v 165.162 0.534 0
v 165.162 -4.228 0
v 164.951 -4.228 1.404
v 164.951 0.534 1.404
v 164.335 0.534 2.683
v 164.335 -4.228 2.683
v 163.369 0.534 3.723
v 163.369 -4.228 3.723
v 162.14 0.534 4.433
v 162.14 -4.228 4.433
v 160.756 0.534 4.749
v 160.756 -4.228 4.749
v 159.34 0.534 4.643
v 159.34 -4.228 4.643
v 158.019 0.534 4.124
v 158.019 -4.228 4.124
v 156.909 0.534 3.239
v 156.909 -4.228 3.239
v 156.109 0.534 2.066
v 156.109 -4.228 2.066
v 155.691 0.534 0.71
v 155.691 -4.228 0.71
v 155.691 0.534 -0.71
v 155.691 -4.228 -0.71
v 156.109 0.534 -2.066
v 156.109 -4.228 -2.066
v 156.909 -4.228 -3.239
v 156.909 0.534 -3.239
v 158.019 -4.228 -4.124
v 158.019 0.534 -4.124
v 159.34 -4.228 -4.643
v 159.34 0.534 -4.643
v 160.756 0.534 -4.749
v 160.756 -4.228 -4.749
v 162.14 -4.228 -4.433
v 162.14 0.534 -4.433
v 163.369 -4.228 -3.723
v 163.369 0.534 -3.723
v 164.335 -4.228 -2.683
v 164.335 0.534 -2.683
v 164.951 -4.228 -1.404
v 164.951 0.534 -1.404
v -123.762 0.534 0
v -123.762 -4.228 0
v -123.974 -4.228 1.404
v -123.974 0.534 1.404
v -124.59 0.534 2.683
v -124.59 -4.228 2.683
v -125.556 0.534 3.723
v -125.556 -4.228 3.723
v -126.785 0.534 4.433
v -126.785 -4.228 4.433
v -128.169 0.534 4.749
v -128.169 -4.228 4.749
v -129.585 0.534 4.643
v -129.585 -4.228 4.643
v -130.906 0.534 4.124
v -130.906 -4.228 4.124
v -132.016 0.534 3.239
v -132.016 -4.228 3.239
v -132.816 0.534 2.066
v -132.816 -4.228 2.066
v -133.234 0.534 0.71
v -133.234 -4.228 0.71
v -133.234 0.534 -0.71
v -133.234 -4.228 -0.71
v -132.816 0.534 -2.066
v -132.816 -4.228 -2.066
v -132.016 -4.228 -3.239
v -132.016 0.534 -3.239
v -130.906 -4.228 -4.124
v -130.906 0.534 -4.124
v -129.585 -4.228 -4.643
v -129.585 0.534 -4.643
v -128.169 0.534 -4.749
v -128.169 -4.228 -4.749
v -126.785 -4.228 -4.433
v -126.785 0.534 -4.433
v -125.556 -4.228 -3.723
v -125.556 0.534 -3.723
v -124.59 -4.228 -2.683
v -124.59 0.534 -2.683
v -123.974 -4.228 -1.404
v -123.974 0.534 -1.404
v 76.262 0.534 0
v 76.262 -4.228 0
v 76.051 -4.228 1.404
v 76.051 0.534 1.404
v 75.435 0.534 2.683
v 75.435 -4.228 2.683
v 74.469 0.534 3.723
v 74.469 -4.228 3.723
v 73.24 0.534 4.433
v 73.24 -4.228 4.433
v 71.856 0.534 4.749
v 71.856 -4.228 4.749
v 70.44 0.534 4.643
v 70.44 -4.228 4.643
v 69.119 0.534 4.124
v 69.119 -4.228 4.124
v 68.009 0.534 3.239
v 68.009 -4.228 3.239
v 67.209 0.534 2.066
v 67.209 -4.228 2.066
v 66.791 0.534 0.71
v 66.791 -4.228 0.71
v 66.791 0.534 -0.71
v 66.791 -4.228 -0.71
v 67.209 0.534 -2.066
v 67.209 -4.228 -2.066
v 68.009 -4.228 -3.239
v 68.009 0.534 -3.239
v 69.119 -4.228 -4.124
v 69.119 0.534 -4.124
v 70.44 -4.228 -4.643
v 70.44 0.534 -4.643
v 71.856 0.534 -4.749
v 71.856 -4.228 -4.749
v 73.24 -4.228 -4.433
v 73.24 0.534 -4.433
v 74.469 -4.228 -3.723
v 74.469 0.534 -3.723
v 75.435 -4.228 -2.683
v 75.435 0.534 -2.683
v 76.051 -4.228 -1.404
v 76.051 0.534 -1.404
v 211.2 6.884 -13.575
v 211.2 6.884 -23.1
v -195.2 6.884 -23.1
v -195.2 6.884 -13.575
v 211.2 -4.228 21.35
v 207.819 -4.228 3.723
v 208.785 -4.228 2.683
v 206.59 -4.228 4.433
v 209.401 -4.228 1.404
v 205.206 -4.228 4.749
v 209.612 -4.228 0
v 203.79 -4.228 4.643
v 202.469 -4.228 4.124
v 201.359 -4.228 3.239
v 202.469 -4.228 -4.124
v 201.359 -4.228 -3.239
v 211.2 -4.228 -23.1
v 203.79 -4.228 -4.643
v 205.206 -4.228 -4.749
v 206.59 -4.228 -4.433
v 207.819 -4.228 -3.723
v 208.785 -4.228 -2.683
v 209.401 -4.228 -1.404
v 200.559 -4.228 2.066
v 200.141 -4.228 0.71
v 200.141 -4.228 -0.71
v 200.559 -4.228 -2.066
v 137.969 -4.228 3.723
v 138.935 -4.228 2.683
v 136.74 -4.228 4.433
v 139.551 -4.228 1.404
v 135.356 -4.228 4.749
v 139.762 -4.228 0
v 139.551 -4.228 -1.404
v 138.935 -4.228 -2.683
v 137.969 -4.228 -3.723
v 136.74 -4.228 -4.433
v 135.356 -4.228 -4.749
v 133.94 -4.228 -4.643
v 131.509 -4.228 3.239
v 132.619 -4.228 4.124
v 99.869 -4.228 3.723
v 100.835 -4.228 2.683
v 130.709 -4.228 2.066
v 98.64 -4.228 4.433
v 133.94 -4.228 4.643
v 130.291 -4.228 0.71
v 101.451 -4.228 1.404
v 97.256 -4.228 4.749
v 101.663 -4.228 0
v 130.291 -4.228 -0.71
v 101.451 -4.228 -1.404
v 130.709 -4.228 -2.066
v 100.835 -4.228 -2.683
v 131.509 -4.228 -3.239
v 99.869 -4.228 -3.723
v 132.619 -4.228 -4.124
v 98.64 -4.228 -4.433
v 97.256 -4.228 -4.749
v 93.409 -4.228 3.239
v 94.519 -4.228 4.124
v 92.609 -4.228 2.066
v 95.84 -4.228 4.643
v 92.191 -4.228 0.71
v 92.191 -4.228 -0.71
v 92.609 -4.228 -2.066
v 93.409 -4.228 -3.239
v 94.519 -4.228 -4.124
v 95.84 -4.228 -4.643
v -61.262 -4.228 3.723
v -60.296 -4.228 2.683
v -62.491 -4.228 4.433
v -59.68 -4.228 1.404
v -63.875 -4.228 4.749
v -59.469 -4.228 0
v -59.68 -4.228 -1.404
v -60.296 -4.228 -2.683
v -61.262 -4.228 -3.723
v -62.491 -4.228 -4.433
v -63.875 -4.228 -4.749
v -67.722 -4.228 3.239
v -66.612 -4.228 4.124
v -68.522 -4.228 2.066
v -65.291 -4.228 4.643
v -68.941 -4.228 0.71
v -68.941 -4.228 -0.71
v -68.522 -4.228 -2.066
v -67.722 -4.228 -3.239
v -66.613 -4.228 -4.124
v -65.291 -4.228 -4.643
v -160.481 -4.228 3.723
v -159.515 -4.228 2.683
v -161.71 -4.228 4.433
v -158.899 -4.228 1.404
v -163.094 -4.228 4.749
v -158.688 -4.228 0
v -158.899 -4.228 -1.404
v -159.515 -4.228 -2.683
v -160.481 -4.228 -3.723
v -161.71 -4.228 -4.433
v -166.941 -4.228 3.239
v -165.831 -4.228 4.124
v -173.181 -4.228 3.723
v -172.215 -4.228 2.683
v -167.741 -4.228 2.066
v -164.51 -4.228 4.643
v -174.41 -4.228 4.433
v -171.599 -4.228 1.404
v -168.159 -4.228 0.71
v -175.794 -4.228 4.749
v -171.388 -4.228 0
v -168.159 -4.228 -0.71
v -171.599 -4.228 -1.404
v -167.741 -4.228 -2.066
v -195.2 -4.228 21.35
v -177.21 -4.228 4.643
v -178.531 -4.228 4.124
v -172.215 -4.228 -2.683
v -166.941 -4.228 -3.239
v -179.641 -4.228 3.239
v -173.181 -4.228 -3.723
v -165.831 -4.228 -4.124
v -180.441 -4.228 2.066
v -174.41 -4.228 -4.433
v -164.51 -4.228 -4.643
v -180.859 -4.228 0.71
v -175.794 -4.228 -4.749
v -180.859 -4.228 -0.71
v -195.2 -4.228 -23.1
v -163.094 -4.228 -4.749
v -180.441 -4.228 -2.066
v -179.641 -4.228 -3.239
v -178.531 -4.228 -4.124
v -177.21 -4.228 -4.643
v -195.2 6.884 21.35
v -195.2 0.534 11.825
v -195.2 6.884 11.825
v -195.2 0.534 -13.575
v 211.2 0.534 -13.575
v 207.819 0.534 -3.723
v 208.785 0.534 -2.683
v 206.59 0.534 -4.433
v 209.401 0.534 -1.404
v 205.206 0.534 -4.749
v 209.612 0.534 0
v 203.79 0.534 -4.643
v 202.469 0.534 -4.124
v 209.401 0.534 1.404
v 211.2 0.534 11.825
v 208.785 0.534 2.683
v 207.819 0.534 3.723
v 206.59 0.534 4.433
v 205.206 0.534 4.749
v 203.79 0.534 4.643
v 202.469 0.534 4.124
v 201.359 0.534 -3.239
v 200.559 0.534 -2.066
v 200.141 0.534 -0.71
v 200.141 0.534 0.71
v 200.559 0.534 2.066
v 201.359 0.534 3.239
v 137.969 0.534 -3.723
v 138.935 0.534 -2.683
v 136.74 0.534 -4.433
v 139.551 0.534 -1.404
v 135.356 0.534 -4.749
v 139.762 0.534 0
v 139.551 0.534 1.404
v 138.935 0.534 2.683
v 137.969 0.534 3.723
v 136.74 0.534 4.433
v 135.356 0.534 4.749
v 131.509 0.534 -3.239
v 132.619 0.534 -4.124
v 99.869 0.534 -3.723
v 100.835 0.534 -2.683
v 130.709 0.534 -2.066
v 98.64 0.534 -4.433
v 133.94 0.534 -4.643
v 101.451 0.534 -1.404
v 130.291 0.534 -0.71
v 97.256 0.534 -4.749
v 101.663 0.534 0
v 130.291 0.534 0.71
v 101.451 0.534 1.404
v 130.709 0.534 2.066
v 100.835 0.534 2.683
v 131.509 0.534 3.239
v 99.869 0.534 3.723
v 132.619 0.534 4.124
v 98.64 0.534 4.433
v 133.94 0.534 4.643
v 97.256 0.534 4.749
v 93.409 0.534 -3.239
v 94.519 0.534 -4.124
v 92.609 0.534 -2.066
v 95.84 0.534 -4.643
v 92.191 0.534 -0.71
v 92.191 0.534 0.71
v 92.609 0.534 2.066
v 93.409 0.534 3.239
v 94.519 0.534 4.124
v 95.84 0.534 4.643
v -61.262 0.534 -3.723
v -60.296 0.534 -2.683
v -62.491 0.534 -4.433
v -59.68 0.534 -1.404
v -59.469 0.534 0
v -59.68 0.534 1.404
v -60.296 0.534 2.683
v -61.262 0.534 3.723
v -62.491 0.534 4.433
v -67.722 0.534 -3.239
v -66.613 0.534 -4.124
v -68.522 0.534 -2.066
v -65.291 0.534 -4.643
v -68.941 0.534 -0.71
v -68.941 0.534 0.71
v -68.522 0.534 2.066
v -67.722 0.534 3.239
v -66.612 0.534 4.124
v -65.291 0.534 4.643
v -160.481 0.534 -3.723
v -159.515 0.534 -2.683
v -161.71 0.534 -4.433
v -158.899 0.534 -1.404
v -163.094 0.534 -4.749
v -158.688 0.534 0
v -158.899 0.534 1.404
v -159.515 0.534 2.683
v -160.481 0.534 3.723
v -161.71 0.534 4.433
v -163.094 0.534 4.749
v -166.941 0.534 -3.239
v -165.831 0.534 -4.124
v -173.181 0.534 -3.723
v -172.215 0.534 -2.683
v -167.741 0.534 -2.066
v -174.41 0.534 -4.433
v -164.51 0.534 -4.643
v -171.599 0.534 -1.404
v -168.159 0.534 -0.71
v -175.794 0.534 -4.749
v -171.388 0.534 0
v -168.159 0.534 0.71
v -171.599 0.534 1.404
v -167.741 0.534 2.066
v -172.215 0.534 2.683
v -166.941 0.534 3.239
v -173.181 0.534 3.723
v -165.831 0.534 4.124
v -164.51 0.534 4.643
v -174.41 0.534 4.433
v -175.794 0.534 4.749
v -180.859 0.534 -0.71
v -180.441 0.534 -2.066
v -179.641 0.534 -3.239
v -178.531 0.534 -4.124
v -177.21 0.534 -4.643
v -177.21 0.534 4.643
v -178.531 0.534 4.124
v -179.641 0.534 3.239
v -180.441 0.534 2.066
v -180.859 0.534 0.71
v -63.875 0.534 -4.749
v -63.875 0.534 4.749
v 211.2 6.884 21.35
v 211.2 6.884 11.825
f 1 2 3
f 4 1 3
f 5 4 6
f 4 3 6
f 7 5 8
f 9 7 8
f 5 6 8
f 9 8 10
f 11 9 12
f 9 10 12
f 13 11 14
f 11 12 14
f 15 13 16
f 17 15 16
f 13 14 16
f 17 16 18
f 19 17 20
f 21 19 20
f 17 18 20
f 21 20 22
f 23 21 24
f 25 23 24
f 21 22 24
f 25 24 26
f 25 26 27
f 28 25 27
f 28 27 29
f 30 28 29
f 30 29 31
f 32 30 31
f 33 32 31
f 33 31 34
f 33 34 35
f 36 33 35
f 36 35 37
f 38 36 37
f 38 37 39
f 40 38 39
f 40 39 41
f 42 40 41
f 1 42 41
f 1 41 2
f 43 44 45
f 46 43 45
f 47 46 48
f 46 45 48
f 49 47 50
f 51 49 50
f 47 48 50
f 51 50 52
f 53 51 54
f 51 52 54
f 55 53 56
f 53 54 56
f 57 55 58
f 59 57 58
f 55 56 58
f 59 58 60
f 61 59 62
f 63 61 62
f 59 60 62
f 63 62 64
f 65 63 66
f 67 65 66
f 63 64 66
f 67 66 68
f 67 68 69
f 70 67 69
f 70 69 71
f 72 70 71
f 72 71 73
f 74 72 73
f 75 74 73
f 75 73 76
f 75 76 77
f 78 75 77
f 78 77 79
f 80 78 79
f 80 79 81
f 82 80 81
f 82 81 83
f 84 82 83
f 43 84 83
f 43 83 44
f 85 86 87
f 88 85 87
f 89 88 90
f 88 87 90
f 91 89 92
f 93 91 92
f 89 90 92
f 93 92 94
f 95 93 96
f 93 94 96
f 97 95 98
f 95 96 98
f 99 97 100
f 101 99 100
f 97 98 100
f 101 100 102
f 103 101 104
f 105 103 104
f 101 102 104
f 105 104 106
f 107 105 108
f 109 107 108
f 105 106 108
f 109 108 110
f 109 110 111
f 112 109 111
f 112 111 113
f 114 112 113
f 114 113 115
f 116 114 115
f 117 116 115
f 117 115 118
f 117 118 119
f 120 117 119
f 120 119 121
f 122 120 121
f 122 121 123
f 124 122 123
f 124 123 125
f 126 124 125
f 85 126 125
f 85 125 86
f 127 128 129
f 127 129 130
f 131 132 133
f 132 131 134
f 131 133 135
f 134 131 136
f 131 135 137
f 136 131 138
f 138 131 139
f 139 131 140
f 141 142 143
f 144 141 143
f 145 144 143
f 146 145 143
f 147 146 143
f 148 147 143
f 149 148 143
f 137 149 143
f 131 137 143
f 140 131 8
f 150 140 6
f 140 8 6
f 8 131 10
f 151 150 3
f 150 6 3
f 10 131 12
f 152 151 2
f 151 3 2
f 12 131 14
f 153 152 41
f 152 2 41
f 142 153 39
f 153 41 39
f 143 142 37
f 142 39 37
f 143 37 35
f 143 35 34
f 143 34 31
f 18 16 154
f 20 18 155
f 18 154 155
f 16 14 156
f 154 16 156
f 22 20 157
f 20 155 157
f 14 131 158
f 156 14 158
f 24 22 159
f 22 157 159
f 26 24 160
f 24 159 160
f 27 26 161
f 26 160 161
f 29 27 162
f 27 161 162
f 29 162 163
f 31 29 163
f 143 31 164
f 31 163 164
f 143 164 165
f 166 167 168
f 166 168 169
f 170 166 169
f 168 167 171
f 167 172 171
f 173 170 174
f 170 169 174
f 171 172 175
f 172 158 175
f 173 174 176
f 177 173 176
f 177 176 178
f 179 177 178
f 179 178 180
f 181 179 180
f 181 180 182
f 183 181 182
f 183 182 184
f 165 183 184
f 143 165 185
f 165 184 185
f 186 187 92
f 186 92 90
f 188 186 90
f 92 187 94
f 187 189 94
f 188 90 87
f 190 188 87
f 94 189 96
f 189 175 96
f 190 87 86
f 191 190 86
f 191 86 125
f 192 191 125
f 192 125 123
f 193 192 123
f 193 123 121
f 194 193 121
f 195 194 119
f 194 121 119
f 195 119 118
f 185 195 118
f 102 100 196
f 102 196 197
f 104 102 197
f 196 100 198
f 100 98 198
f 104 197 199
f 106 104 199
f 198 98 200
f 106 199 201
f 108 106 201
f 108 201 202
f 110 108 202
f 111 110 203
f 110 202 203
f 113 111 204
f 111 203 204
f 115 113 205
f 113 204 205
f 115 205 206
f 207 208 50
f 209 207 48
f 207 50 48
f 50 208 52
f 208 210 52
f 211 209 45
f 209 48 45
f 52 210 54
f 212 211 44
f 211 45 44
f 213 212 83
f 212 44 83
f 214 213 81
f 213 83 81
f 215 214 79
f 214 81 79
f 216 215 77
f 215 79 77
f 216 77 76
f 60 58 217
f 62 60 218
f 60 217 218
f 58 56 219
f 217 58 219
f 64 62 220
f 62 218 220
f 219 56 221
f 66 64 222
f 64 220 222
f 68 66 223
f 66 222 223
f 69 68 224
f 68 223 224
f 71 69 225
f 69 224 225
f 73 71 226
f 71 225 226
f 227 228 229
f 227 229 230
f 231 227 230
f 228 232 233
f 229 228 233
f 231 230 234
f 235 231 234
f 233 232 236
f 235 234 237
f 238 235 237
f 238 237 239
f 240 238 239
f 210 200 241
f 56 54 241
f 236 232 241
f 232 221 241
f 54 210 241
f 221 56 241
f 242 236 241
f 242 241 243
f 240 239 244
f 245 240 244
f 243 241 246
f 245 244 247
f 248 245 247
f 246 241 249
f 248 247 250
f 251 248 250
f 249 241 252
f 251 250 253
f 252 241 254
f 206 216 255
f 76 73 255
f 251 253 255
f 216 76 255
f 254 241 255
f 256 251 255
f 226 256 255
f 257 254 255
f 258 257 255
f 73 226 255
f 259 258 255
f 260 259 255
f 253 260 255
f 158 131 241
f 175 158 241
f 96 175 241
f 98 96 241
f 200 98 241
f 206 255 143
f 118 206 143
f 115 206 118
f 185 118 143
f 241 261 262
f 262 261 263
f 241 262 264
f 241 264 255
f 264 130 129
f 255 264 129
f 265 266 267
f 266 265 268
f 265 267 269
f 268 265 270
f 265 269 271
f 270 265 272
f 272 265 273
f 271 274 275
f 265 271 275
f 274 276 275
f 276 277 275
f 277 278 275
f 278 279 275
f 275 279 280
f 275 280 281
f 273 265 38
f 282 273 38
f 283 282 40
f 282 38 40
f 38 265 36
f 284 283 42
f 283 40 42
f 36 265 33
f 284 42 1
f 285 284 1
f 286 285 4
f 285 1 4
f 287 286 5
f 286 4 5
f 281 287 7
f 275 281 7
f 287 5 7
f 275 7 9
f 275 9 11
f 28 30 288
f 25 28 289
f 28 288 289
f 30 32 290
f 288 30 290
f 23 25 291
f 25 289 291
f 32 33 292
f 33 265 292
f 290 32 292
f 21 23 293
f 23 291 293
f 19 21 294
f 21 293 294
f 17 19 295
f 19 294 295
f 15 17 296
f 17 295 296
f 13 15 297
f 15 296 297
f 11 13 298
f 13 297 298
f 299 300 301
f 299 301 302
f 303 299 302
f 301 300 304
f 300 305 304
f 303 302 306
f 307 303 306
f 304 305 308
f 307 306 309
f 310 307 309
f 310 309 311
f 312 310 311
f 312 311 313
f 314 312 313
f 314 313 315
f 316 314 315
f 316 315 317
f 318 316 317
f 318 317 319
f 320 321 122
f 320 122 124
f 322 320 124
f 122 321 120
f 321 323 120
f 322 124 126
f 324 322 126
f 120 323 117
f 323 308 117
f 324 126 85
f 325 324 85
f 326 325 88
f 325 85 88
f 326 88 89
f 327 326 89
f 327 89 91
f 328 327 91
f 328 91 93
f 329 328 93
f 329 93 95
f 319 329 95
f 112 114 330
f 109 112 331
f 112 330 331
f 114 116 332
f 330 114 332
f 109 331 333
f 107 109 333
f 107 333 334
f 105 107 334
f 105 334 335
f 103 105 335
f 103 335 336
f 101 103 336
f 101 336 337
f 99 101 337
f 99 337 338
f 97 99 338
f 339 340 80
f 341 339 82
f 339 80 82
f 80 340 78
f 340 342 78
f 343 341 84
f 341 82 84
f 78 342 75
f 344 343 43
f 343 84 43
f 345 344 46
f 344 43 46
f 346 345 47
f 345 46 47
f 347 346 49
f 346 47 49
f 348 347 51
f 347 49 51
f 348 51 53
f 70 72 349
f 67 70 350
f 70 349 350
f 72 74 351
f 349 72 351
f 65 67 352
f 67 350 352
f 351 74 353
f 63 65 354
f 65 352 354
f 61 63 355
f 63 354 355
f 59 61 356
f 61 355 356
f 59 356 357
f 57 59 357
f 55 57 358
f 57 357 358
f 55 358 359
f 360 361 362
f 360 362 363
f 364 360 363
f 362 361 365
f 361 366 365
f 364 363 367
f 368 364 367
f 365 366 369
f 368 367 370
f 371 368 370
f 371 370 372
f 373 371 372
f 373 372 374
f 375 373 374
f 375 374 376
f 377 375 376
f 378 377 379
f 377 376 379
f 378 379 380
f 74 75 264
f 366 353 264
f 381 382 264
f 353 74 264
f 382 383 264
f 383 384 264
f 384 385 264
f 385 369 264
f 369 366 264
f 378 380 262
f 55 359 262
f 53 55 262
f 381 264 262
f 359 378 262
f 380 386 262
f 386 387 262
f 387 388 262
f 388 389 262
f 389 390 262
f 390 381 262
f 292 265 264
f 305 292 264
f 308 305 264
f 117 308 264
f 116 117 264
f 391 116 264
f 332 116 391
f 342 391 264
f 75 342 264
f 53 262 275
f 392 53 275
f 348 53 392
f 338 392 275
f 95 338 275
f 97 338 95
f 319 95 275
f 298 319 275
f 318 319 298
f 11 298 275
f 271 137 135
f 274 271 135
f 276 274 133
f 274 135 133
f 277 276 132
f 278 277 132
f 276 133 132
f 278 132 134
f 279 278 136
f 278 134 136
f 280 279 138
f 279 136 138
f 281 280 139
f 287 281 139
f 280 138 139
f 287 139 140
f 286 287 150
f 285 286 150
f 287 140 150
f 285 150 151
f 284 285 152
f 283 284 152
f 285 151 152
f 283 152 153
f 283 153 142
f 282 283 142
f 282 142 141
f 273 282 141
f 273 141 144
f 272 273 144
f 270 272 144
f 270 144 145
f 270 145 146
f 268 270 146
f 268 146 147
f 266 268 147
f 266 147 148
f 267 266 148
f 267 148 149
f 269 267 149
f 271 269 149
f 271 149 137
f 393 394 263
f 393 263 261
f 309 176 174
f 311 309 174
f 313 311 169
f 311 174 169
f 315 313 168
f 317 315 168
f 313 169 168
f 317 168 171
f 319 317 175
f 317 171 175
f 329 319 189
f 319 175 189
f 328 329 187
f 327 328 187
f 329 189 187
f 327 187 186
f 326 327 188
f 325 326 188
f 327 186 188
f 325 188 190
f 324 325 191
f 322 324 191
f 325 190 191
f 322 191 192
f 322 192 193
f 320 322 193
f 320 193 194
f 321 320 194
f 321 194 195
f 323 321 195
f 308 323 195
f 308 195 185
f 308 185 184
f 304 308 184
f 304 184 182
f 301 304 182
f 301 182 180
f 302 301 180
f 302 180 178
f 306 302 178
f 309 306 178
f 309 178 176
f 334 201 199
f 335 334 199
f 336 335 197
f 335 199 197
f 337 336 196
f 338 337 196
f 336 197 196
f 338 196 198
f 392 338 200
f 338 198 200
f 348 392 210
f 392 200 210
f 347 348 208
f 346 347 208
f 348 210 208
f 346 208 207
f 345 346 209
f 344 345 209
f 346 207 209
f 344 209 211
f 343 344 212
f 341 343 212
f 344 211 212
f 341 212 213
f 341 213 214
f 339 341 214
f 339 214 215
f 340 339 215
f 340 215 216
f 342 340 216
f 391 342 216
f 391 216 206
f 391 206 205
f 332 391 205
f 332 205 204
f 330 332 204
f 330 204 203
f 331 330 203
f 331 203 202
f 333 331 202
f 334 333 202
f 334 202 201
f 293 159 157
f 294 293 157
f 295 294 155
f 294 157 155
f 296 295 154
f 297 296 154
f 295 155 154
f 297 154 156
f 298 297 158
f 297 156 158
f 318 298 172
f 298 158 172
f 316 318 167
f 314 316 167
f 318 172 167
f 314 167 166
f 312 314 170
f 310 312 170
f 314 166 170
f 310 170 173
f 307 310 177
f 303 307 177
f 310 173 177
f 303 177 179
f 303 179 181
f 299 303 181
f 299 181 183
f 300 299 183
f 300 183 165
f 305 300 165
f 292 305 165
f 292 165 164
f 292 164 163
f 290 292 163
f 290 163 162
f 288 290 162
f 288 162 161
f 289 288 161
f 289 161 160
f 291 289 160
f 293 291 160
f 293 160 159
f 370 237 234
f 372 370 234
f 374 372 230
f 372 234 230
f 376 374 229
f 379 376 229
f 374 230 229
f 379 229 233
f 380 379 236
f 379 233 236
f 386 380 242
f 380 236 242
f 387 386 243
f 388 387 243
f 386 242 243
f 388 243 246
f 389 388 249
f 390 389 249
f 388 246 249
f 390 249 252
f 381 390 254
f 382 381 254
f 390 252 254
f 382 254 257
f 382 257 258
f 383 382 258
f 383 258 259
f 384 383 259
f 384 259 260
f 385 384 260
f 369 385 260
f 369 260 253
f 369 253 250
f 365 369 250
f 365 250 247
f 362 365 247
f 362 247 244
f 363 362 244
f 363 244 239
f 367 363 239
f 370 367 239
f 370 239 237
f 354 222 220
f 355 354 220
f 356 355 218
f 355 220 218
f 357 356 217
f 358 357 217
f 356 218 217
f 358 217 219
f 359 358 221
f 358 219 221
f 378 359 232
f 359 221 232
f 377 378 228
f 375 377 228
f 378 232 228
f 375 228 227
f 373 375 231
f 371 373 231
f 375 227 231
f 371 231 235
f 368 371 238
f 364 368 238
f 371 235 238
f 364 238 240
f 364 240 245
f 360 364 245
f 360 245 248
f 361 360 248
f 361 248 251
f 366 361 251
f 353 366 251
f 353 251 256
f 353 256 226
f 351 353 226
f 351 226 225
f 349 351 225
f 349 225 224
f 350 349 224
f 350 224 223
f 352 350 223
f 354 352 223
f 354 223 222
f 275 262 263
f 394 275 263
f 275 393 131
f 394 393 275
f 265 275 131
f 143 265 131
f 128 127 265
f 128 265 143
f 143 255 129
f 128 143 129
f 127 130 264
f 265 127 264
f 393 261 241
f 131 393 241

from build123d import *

# Parameters (mm, degrees)
BOSS_EXTRUDE1_DEPTH = 16
SCALE1_SCALE        = 25.4
SKETCH2_R           = 4.7625
CUT_EXTRUDE1_DEPTH  = 12.112499989


with BuildPart() as part:
    # Sketch1 → Boss-Extrude1 (new body)
    with BuildSketch(Plane(origin=(0, 0, 0), x_dir=(0, 0, -1), z_dir=(1, 0, 0))):
        Polygon((0, 0.4375), (0, 0), (1.75, 0), (1.75, 0.4375), (1.375, 0.4375), (1.375, 0.1875), (0.375, 0.1875), (0.375, 0.4375), align=None)
    extrude(amount=BOSS_EXTRUDE1_DEPTH)


with BuildPart() as part_1:
    # Scale1: scaled about (8, 0.173295455, -0.875)
    add(part.part.scale(SCALE1_SCALE).moved(Location((-195.2, -4.228409102, 21.35))))

    # Sketch2 → Cut-Extrude1 (cut, through all)
    with BuildSketch(Plane.XZ.offset(4.228409091)):
        with Locations((-176.15, 0)):
            Circle(SKETCH2_R)
        with Locations((-163.45, 0)):
            Circle(SKETCH2_R)
        with Locations((-128.525, 0)):
            Circle(SKETCH2_R)
        with Locations((-64.23125, 0)):
            Circle(SKETCH2_R)
        with Locations((71.5, 0)):
            Circle(SKETCH2_R)
        with Locations((96.9, 0)):
            Circle(SKETCH2_R)
        with Locations((135, 0)):
            Circle(SKETCH2_R)
        with Locations((160.4, 0)):
            Circle(SKETCH2_R)
        with Locations((204.85, 0)):
            Circle(SKETCH2_R)
    extrude(amount=-CUT_EXTRUDE1_DEPTH, mode=Mode.SUBTRACT)


solid = part_1.part
